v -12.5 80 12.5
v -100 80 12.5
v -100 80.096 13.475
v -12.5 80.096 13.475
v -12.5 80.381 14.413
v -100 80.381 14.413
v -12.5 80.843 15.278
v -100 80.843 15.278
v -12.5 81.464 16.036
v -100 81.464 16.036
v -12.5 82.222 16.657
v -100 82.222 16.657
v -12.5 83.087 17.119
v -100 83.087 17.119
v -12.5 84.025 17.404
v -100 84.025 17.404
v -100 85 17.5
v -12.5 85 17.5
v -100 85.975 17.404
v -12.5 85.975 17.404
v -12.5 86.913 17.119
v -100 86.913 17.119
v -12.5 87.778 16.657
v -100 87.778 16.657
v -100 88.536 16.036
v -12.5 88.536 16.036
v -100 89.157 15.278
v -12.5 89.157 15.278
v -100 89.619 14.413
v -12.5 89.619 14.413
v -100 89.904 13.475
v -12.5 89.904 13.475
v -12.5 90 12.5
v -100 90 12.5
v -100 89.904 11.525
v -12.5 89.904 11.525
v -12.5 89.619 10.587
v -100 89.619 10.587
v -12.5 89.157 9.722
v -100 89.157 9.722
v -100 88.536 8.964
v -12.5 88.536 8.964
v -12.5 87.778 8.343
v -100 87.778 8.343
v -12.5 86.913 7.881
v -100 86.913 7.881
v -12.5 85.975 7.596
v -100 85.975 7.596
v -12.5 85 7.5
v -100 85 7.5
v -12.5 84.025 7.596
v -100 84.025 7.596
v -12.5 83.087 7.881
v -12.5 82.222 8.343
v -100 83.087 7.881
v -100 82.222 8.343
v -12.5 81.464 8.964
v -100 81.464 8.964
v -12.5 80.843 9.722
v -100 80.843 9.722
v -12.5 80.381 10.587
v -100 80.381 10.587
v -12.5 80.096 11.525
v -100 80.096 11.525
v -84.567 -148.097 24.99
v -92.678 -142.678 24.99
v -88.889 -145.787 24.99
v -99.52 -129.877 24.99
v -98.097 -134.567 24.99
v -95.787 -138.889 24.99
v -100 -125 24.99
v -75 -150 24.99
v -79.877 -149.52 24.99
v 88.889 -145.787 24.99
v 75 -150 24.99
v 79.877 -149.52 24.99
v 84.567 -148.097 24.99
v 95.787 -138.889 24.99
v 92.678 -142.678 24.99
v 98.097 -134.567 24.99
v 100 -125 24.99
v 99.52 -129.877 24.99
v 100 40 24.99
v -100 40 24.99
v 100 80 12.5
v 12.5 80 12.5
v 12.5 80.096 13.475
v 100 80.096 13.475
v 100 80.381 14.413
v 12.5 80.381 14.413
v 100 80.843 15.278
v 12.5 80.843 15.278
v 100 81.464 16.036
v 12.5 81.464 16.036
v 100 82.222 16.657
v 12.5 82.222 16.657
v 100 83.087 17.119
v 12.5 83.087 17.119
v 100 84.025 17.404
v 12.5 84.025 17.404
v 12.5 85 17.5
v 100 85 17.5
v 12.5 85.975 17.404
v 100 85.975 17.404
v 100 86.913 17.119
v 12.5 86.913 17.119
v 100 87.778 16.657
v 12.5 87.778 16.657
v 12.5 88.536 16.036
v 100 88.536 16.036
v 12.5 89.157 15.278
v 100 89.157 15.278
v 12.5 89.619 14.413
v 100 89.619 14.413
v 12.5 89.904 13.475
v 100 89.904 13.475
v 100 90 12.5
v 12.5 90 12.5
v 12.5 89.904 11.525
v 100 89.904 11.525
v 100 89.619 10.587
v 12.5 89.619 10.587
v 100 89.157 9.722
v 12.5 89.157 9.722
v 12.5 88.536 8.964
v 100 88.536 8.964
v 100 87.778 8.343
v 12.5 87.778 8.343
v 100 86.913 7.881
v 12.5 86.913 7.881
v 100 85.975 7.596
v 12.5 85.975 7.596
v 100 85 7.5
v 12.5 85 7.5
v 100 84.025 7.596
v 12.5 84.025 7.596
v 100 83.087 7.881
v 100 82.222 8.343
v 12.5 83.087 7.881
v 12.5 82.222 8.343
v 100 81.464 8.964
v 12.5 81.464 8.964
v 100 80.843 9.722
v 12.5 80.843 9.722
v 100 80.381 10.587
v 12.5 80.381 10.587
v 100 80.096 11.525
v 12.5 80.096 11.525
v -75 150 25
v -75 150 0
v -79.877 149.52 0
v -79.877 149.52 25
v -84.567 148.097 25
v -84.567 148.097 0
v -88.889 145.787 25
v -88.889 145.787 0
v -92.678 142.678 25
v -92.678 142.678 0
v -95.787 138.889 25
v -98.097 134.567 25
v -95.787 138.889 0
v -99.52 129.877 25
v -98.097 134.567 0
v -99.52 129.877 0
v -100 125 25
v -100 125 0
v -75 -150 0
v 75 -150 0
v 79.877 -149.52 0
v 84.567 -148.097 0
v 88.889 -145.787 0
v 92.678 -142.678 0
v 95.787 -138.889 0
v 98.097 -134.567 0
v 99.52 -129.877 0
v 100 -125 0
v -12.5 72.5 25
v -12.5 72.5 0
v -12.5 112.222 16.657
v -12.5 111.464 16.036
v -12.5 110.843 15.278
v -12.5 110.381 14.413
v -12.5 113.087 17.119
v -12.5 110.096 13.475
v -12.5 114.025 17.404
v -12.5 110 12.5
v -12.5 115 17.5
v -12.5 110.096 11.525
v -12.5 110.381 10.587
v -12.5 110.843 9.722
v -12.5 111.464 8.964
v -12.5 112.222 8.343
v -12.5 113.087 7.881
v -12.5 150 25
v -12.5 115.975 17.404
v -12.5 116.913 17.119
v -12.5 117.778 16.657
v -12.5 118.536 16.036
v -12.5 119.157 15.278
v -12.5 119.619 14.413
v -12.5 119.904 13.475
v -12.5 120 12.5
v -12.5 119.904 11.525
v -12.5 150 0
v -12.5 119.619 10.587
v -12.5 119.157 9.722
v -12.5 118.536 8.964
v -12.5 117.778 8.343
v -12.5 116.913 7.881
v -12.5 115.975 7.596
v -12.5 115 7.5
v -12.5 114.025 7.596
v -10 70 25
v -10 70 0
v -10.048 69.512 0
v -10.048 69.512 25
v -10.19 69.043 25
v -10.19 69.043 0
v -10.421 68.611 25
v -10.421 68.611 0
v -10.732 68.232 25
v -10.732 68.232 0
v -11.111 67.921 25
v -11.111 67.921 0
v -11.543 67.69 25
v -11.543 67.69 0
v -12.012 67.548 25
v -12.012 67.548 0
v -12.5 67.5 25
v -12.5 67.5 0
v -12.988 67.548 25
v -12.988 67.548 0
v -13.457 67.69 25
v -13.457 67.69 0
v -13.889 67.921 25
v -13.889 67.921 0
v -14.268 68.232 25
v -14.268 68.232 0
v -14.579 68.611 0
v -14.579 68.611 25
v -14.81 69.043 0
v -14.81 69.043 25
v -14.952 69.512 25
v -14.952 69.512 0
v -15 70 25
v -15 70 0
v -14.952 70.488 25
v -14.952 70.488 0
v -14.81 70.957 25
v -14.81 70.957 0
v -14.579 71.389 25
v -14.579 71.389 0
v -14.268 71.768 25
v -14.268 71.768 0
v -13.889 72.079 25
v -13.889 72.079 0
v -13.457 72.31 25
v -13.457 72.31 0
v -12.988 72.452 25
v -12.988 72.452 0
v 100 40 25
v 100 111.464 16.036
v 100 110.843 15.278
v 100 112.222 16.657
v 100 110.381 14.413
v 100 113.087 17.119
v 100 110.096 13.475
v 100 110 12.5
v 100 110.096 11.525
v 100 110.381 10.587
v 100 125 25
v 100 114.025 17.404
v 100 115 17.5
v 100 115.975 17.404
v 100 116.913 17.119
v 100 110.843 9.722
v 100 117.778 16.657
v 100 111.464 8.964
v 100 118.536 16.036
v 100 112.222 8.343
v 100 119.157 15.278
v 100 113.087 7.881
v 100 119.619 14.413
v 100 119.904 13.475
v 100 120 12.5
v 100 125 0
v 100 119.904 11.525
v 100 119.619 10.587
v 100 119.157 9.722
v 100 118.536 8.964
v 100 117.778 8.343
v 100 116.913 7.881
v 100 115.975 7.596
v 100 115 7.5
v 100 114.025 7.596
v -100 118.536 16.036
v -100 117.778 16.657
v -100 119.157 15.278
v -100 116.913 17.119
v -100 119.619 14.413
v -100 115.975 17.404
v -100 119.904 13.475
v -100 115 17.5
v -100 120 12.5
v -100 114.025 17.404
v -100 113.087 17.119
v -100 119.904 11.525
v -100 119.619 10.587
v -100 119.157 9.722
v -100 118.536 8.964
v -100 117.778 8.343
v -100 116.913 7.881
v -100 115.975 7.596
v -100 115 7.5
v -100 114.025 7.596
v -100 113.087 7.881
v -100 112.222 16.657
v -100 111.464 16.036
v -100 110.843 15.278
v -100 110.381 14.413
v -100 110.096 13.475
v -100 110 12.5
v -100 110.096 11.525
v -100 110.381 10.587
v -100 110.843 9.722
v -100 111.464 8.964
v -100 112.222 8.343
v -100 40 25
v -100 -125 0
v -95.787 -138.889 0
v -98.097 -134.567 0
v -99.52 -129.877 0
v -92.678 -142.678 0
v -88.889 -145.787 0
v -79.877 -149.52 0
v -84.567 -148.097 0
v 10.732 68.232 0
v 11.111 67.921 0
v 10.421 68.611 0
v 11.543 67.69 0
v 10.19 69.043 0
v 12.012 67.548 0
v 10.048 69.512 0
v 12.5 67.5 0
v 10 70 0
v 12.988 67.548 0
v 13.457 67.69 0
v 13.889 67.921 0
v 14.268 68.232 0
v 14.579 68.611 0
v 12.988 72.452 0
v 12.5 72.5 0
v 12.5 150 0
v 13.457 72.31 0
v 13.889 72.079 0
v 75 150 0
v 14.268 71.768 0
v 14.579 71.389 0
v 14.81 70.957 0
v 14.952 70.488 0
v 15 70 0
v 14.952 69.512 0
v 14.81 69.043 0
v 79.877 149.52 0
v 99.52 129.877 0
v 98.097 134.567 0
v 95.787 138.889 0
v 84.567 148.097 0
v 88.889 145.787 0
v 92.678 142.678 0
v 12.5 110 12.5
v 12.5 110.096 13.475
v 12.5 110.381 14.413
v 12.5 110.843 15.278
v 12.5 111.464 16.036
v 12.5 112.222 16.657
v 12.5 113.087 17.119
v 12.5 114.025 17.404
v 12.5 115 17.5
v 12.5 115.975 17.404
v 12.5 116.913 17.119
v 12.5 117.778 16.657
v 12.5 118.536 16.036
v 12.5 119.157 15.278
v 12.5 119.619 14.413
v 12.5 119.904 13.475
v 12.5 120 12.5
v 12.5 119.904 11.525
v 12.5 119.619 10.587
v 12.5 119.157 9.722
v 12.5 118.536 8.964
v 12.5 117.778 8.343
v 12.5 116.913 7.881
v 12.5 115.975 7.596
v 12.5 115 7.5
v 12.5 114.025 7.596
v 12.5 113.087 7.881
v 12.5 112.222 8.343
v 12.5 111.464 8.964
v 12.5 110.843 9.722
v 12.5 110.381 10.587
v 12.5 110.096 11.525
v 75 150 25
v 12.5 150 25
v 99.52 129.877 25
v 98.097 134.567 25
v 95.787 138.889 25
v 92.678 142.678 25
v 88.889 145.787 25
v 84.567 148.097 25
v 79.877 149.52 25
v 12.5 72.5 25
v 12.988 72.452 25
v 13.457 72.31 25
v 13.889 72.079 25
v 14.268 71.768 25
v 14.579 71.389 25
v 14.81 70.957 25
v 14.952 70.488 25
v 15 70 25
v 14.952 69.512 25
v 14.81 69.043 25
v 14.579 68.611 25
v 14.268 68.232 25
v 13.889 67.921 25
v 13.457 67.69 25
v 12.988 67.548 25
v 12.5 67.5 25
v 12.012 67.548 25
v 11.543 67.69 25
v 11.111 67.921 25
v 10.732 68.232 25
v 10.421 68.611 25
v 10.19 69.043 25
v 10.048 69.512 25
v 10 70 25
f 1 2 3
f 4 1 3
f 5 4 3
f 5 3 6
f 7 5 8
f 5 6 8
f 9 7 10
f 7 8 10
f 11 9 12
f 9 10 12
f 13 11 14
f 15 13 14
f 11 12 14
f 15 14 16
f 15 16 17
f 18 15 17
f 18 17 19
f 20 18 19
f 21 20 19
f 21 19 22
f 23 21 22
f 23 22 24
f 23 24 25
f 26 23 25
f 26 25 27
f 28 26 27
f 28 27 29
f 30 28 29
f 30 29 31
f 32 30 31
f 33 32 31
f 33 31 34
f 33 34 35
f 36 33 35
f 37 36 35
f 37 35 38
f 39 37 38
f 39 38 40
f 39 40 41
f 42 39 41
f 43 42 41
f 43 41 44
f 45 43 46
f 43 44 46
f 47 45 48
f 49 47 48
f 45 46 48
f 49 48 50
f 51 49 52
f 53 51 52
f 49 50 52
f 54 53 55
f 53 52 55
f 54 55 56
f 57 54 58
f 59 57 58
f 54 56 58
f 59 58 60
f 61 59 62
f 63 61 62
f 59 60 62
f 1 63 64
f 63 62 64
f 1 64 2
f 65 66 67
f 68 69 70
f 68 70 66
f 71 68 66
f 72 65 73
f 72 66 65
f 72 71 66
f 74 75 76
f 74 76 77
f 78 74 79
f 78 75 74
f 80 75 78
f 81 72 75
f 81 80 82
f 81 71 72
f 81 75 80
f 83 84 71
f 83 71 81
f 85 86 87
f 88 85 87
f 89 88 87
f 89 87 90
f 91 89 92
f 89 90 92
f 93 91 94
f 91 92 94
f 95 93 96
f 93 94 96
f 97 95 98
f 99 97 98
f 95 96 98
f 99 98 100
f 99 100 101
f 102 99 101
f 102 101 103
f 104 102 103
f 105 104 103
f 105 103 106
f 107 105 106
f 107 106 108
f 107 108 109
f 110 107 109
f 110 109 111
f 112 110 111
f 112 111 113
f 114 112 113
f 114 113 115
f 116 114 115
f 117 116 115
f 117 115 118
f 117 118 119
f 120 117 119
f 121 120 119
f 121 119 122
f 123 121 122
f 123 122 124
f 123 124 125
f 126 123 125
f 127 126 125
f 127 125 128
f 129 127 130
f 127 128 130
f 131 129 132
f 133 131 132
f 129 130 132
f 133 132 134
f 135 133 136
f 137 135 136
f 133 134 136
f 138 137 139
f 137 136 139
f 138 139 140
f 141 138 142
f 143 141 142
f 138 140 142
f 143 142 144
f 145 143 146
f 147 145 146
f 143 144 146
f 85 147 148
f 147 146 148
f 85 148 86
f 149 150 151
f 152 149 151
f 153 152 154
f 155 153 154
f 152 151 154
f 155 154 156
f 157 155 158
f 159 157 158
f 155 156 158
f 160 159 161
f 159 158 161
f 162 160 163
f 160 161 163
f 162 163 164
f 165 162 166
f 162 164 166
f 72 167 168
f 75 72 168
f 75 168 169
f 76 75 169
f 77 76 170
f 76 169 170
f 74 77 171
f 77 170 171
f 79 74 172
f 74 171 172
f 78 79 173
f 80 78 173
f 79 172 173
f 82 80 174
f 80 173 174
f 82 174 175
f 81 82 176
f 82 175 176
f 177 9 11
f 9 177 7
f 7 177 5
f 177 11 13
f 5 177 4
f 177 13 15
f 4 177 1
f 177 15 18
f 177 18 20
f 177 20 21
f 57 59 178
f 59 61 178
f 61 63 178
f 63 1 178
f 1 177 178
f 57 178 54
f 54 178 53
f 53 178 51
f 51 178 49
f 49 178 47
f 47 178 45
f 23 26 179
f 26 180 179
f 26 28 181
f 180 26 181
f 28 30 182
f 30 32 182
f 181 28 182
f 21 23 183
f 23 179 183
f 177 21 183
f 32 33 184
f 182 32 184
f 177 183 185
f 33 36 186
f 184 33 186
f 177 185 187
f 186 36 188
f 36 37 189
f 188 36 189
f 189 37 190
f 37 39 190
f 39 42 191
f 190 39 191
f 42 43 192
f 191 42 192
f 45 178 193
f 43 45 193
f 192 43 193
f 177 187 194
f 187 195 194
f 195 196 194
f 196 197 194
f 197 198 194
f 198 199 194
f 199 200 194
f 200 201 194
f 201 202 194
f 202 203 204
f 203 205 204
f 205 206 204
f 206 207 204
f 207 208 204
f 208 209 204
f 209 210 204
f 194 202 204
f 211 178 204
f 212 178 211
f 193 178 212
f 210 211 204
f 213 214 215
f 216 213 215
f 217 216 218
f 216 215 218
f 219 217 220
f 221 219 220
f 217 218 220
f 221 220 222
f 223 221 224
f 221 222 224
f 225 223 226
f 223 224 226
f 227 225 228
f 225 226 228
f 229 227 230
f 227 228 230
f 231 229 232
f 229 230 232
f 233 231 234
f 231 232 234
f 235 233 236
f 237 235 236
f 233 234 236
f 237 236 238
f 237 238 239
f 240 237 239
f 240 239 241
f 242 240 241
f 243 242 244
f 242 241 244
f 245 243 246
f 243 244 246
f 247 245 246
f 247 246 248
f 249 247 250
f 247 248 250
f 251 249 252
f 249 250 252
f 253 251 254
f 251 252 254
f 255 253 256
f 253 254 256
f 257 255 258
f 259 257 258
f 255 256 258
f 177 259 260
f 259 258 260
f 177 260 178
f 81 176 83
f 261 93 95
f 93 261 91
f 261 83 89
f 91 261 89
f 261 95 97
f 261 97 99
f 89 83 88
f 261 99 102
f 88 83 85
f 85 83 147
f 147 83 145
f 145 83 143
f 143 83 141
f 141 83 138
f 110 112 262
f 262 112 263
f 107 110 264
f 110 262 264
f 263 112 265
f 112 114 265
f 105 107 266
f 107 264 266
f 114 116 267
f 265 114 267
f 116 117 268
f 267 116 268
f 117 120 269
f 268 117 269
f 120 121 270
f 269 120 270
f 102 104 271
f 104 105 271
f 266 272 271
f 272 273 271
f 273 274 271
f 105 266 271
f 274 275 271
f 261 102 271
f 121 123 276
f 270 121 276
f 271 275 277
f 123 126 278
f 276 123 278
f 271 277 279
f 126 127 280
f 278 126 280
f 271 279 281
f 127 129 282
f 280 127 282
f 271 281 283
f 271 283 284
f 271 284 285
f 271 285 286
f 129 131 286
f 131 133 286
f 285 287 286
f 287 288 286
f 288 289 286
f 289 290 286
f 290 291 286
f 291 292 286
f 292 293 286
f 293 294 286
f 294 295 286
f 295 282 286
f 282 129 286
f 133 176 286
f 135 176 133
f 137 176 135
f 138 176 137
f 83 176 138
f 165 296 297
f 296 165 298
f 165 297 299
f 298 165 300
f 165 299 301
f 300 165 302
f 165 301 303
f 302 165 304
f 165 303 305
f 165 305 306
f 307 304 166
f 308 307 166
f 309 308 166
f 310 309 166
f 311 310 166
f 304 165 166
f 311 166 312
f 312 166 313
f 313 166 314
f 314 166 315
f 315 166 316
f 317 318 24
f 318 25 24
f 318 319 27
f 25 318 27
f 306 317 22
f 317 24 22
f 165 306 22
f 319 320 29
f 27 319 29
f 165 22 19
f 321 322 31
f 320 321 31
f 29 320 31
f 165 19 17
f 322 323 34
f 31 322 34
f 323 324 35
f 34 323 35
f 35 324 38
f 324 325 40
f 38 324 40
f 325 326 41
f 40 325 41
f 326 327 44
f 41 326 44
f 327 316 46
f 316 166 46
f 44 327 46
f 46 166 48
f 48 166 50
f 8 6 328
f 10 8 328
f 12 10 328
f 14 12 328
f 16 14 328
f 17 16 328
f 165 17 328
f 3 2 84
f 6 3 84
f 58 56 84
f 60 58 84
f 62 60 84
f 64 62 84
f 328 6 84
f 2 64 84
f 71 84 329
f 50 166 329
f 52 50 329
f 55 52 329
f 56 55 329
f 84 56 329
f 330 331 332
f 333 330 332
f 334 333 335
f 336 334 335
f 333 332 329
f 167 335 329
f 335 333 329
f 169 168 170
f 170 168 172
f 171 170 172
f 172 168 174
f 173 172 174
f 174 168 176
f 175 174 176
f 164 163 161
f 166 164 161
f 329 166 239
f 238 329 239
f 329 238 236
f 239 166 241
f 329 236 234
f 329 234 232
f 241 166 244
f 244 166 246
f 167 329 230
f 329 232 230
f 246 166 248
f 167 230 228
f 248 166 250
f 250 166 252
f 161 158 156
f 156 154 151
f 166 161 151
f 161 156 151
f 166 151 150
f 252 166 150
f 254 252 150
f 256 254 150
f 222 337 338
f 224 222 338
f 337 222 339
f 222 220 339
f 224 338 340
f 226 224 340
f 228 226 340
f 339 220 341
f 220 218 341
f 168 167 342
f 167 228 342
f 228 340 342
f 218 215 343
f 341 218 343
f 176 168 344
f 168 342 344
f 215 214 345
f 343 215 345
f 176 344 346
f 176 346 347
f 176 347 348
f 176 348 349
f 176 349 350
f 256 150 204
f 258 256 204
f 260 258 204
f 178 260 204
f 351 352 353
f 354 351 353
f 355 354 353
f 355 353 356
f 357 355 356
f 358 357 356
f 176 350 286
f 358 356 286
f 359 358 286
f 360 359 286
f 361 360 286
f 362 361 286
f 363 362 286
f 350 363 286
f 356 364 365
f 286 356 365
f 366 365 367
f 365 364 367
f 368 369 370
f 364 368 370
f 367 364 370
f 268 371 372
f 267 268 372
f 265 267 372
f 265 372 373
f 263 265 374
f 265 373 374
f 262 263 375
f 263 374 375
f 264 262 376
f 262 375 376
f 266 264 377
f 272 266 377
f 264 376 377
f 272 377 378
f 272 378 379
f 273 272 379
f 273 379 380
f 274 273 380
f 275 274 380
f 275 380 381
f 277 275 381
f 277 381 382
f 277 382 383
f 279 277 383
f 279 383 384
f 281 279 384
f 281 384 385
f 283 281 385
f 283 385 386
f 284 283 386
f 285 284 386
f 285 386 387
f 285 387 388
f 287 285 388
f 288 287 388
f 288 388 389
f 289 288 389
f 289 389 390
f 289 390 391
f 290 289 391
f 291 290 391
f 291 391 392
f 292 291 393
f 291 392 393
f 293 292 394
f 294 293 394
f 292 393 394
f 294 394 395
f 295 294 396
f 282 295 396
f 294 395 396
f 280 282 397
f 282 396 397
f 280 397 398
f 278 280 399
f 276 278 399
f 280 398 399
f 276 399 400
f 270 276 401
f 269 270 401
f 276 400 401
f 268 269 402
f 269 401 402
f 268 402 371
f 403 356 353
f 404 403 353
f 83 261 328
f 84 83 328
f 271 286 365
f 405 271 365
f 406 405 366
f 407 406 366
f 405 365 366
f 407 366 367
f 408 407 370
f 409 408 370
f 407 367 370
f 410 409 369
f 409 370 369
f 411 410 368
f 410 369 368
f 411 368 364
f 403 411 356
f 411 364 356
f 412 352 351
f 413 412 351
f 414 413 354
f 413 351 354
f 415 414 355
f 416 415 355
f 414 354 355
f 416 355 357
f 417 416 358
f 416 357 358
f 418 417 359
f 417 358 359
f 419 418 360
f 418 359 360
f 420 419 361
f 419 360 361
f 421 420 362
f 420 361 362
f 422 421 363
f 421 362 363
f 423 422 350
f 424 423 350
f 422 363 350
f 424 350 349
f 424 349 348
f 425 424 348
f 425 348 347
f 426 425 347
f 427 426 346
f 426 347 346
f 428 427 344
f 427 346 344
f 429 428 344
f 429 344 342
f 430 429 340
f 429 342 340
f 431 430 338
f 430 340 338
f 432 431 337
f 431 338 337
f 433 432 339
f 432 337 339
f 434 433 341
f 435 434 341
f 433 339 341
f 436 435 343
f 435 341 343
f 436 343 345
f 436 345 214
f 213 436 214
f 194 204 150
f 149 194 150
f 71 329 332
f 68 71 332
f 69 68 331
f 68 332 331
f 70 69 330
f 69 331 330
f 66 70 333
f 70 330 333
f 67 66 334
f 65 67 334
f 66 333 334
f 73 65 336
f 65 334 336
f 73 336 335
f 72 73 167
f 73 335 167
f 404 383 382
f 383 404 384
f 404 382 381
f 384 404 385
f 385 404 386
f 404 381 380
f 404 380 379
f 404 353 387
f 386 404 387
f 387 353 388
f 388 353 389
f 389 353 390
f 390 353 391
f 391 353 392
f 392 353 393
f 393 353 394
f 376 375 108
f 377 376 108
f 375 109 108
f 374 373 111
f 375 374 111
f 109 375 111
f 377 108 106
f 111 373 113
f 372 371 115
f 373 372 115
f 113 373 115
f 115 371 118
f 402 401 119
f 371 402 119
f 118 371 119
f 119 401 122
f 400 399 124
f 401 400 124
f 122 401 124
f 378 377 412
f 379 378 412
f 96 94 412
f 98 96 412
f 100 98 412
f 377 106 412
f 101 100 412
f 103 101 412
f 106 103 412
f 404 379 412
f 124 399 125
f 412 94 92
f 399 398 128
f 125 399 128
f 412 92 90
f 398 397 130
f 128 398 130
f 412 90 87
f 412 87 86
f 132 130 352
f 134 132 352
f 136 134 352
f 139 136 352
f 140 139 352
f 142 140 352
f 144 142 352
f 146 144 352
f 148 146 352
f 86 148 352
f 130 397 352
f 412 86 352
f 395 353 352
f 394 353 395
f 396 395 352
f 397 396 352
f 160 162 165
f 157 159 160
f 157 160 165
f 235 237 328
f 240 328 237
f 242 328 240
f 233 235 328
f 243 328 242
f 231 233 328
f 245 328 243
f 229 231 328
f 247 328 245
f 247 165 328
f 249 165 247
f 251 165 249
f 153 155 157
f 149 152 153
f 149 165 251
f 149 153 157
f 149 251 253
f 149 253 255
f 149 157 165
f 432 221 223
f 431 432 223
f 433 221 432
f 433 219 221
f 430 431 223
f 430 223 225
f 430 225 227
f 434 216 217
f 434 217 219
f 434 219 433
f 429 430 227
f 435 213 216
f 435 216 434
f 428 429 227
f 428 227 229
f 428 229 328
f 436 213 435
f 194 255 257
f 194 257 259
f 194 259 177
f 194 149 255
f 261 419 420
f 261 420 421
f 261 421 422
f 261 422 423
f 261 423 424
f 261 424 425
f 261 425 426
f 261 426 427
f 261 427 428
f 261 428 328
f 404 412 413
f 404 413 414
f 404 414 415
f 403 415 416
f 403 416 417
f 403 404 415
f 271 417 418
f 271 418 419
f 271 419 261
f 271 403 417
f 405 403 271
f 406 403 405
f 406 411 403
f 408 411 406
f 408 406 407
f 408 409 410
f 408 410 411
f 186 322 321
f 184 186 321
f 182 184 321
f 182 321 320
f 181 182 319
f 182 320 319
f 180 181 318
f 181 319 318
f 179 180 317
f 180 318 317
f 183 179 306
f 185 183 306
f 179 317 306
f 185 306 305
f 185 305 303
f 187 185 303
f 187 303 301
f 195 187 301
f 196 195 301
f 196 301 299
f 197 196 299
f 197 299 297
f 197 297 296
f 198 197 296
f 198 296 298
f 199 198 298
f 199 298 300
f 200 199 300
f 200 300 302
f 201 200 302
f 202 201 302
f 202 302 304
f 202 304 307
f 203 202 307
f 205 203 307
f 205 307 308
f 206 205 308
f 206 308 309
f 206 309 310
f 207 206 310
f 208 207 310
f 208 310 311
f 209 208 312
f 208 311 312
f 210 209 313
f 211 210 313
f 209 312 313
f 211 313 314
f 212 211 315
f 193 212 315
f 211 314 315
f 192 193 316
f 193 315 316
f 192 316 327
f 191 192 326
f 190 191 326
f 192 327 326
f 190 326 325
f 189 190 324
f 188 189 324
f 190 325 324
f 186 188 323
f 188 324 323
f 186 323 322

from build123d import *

# Parameters (mm, degrees)
F1_DEPTH = 25
F2_R     = 5
F3_DEPTH = 200.001
F5_DEPTH = 0.01


with BuildPart() as f1:
    # F0 (on Top) → F1 (new body)
    with BuildSketch(Plane.XY):
        with BuildLine():
            Line((-12.5, 150), (-75, 150))
            ThreePointArc((-75, 150), (-92.67767, 142.67767), (-100, 125))
            Line((-100, 125), (-100, -125))
            ThreePointArc((-100, -125), (-92.67767, -142.67767), (-75, -150))
            Line((-75, -150), (75, -150))
            ThreePointArc((75, -150), (92.67767, -142.67767), (100, -125))
            Line((100, -125), (100, 125))
            ThreePointArc((100, 125), (92.67767, 142.67767), (75, 150))
            Line((75, 150), (12.5, 150))
            Line((12.5, 150), (12.5, 72.5))
            ThreePointArc((12.5, 72.5), (14.267767, 68.232233), (10, 70))
            Line((10, 70), (-10, 70))
            ThreePointArc((-10, 70), (-14.267767, 68.232233), (-12.5, 72.5))
            Line((-12.5, 72.5), (-12.5, 150))
        make_face()
    extrude(amount=F1_DEPTH)

    # F2 (on face) → F3 (cut, through all)
    with BuildSketch(Plane(origin=(-100, 0, 0), x_dir=(0, -1, 0), z_dir=(-1, 0, 0))):
        with Locations((-115, 12.5)):
            Circle(F2_R)
        with Locations((-85, 12.5)):
            Circle(F2_R)
    extrude(amount=-F3_DEPTH, mode=Mode.SUBTRACT)

    # F4 (on face) → F5 (cut)
    with BuildSketch(Plane.XY.offset(25)):
        with BuildLine():
            ThreePointArc((-100, -125), (-92.67767, -142.67767), (-75, -150))
            Line((-75, -150), (75, -150))
            ThreePointArc((75, -150), (92.67767, -142.67767), (100, -125))
            Line((100, -125), (100, 40))
            Line((100, 40), (-100, 40))
            Line((-100, 40), (-100, -125))
        make_face()
    extrude(amount=-F5_DEPTH, mode=Mode.SUBTRACT)


solid = f1.part
